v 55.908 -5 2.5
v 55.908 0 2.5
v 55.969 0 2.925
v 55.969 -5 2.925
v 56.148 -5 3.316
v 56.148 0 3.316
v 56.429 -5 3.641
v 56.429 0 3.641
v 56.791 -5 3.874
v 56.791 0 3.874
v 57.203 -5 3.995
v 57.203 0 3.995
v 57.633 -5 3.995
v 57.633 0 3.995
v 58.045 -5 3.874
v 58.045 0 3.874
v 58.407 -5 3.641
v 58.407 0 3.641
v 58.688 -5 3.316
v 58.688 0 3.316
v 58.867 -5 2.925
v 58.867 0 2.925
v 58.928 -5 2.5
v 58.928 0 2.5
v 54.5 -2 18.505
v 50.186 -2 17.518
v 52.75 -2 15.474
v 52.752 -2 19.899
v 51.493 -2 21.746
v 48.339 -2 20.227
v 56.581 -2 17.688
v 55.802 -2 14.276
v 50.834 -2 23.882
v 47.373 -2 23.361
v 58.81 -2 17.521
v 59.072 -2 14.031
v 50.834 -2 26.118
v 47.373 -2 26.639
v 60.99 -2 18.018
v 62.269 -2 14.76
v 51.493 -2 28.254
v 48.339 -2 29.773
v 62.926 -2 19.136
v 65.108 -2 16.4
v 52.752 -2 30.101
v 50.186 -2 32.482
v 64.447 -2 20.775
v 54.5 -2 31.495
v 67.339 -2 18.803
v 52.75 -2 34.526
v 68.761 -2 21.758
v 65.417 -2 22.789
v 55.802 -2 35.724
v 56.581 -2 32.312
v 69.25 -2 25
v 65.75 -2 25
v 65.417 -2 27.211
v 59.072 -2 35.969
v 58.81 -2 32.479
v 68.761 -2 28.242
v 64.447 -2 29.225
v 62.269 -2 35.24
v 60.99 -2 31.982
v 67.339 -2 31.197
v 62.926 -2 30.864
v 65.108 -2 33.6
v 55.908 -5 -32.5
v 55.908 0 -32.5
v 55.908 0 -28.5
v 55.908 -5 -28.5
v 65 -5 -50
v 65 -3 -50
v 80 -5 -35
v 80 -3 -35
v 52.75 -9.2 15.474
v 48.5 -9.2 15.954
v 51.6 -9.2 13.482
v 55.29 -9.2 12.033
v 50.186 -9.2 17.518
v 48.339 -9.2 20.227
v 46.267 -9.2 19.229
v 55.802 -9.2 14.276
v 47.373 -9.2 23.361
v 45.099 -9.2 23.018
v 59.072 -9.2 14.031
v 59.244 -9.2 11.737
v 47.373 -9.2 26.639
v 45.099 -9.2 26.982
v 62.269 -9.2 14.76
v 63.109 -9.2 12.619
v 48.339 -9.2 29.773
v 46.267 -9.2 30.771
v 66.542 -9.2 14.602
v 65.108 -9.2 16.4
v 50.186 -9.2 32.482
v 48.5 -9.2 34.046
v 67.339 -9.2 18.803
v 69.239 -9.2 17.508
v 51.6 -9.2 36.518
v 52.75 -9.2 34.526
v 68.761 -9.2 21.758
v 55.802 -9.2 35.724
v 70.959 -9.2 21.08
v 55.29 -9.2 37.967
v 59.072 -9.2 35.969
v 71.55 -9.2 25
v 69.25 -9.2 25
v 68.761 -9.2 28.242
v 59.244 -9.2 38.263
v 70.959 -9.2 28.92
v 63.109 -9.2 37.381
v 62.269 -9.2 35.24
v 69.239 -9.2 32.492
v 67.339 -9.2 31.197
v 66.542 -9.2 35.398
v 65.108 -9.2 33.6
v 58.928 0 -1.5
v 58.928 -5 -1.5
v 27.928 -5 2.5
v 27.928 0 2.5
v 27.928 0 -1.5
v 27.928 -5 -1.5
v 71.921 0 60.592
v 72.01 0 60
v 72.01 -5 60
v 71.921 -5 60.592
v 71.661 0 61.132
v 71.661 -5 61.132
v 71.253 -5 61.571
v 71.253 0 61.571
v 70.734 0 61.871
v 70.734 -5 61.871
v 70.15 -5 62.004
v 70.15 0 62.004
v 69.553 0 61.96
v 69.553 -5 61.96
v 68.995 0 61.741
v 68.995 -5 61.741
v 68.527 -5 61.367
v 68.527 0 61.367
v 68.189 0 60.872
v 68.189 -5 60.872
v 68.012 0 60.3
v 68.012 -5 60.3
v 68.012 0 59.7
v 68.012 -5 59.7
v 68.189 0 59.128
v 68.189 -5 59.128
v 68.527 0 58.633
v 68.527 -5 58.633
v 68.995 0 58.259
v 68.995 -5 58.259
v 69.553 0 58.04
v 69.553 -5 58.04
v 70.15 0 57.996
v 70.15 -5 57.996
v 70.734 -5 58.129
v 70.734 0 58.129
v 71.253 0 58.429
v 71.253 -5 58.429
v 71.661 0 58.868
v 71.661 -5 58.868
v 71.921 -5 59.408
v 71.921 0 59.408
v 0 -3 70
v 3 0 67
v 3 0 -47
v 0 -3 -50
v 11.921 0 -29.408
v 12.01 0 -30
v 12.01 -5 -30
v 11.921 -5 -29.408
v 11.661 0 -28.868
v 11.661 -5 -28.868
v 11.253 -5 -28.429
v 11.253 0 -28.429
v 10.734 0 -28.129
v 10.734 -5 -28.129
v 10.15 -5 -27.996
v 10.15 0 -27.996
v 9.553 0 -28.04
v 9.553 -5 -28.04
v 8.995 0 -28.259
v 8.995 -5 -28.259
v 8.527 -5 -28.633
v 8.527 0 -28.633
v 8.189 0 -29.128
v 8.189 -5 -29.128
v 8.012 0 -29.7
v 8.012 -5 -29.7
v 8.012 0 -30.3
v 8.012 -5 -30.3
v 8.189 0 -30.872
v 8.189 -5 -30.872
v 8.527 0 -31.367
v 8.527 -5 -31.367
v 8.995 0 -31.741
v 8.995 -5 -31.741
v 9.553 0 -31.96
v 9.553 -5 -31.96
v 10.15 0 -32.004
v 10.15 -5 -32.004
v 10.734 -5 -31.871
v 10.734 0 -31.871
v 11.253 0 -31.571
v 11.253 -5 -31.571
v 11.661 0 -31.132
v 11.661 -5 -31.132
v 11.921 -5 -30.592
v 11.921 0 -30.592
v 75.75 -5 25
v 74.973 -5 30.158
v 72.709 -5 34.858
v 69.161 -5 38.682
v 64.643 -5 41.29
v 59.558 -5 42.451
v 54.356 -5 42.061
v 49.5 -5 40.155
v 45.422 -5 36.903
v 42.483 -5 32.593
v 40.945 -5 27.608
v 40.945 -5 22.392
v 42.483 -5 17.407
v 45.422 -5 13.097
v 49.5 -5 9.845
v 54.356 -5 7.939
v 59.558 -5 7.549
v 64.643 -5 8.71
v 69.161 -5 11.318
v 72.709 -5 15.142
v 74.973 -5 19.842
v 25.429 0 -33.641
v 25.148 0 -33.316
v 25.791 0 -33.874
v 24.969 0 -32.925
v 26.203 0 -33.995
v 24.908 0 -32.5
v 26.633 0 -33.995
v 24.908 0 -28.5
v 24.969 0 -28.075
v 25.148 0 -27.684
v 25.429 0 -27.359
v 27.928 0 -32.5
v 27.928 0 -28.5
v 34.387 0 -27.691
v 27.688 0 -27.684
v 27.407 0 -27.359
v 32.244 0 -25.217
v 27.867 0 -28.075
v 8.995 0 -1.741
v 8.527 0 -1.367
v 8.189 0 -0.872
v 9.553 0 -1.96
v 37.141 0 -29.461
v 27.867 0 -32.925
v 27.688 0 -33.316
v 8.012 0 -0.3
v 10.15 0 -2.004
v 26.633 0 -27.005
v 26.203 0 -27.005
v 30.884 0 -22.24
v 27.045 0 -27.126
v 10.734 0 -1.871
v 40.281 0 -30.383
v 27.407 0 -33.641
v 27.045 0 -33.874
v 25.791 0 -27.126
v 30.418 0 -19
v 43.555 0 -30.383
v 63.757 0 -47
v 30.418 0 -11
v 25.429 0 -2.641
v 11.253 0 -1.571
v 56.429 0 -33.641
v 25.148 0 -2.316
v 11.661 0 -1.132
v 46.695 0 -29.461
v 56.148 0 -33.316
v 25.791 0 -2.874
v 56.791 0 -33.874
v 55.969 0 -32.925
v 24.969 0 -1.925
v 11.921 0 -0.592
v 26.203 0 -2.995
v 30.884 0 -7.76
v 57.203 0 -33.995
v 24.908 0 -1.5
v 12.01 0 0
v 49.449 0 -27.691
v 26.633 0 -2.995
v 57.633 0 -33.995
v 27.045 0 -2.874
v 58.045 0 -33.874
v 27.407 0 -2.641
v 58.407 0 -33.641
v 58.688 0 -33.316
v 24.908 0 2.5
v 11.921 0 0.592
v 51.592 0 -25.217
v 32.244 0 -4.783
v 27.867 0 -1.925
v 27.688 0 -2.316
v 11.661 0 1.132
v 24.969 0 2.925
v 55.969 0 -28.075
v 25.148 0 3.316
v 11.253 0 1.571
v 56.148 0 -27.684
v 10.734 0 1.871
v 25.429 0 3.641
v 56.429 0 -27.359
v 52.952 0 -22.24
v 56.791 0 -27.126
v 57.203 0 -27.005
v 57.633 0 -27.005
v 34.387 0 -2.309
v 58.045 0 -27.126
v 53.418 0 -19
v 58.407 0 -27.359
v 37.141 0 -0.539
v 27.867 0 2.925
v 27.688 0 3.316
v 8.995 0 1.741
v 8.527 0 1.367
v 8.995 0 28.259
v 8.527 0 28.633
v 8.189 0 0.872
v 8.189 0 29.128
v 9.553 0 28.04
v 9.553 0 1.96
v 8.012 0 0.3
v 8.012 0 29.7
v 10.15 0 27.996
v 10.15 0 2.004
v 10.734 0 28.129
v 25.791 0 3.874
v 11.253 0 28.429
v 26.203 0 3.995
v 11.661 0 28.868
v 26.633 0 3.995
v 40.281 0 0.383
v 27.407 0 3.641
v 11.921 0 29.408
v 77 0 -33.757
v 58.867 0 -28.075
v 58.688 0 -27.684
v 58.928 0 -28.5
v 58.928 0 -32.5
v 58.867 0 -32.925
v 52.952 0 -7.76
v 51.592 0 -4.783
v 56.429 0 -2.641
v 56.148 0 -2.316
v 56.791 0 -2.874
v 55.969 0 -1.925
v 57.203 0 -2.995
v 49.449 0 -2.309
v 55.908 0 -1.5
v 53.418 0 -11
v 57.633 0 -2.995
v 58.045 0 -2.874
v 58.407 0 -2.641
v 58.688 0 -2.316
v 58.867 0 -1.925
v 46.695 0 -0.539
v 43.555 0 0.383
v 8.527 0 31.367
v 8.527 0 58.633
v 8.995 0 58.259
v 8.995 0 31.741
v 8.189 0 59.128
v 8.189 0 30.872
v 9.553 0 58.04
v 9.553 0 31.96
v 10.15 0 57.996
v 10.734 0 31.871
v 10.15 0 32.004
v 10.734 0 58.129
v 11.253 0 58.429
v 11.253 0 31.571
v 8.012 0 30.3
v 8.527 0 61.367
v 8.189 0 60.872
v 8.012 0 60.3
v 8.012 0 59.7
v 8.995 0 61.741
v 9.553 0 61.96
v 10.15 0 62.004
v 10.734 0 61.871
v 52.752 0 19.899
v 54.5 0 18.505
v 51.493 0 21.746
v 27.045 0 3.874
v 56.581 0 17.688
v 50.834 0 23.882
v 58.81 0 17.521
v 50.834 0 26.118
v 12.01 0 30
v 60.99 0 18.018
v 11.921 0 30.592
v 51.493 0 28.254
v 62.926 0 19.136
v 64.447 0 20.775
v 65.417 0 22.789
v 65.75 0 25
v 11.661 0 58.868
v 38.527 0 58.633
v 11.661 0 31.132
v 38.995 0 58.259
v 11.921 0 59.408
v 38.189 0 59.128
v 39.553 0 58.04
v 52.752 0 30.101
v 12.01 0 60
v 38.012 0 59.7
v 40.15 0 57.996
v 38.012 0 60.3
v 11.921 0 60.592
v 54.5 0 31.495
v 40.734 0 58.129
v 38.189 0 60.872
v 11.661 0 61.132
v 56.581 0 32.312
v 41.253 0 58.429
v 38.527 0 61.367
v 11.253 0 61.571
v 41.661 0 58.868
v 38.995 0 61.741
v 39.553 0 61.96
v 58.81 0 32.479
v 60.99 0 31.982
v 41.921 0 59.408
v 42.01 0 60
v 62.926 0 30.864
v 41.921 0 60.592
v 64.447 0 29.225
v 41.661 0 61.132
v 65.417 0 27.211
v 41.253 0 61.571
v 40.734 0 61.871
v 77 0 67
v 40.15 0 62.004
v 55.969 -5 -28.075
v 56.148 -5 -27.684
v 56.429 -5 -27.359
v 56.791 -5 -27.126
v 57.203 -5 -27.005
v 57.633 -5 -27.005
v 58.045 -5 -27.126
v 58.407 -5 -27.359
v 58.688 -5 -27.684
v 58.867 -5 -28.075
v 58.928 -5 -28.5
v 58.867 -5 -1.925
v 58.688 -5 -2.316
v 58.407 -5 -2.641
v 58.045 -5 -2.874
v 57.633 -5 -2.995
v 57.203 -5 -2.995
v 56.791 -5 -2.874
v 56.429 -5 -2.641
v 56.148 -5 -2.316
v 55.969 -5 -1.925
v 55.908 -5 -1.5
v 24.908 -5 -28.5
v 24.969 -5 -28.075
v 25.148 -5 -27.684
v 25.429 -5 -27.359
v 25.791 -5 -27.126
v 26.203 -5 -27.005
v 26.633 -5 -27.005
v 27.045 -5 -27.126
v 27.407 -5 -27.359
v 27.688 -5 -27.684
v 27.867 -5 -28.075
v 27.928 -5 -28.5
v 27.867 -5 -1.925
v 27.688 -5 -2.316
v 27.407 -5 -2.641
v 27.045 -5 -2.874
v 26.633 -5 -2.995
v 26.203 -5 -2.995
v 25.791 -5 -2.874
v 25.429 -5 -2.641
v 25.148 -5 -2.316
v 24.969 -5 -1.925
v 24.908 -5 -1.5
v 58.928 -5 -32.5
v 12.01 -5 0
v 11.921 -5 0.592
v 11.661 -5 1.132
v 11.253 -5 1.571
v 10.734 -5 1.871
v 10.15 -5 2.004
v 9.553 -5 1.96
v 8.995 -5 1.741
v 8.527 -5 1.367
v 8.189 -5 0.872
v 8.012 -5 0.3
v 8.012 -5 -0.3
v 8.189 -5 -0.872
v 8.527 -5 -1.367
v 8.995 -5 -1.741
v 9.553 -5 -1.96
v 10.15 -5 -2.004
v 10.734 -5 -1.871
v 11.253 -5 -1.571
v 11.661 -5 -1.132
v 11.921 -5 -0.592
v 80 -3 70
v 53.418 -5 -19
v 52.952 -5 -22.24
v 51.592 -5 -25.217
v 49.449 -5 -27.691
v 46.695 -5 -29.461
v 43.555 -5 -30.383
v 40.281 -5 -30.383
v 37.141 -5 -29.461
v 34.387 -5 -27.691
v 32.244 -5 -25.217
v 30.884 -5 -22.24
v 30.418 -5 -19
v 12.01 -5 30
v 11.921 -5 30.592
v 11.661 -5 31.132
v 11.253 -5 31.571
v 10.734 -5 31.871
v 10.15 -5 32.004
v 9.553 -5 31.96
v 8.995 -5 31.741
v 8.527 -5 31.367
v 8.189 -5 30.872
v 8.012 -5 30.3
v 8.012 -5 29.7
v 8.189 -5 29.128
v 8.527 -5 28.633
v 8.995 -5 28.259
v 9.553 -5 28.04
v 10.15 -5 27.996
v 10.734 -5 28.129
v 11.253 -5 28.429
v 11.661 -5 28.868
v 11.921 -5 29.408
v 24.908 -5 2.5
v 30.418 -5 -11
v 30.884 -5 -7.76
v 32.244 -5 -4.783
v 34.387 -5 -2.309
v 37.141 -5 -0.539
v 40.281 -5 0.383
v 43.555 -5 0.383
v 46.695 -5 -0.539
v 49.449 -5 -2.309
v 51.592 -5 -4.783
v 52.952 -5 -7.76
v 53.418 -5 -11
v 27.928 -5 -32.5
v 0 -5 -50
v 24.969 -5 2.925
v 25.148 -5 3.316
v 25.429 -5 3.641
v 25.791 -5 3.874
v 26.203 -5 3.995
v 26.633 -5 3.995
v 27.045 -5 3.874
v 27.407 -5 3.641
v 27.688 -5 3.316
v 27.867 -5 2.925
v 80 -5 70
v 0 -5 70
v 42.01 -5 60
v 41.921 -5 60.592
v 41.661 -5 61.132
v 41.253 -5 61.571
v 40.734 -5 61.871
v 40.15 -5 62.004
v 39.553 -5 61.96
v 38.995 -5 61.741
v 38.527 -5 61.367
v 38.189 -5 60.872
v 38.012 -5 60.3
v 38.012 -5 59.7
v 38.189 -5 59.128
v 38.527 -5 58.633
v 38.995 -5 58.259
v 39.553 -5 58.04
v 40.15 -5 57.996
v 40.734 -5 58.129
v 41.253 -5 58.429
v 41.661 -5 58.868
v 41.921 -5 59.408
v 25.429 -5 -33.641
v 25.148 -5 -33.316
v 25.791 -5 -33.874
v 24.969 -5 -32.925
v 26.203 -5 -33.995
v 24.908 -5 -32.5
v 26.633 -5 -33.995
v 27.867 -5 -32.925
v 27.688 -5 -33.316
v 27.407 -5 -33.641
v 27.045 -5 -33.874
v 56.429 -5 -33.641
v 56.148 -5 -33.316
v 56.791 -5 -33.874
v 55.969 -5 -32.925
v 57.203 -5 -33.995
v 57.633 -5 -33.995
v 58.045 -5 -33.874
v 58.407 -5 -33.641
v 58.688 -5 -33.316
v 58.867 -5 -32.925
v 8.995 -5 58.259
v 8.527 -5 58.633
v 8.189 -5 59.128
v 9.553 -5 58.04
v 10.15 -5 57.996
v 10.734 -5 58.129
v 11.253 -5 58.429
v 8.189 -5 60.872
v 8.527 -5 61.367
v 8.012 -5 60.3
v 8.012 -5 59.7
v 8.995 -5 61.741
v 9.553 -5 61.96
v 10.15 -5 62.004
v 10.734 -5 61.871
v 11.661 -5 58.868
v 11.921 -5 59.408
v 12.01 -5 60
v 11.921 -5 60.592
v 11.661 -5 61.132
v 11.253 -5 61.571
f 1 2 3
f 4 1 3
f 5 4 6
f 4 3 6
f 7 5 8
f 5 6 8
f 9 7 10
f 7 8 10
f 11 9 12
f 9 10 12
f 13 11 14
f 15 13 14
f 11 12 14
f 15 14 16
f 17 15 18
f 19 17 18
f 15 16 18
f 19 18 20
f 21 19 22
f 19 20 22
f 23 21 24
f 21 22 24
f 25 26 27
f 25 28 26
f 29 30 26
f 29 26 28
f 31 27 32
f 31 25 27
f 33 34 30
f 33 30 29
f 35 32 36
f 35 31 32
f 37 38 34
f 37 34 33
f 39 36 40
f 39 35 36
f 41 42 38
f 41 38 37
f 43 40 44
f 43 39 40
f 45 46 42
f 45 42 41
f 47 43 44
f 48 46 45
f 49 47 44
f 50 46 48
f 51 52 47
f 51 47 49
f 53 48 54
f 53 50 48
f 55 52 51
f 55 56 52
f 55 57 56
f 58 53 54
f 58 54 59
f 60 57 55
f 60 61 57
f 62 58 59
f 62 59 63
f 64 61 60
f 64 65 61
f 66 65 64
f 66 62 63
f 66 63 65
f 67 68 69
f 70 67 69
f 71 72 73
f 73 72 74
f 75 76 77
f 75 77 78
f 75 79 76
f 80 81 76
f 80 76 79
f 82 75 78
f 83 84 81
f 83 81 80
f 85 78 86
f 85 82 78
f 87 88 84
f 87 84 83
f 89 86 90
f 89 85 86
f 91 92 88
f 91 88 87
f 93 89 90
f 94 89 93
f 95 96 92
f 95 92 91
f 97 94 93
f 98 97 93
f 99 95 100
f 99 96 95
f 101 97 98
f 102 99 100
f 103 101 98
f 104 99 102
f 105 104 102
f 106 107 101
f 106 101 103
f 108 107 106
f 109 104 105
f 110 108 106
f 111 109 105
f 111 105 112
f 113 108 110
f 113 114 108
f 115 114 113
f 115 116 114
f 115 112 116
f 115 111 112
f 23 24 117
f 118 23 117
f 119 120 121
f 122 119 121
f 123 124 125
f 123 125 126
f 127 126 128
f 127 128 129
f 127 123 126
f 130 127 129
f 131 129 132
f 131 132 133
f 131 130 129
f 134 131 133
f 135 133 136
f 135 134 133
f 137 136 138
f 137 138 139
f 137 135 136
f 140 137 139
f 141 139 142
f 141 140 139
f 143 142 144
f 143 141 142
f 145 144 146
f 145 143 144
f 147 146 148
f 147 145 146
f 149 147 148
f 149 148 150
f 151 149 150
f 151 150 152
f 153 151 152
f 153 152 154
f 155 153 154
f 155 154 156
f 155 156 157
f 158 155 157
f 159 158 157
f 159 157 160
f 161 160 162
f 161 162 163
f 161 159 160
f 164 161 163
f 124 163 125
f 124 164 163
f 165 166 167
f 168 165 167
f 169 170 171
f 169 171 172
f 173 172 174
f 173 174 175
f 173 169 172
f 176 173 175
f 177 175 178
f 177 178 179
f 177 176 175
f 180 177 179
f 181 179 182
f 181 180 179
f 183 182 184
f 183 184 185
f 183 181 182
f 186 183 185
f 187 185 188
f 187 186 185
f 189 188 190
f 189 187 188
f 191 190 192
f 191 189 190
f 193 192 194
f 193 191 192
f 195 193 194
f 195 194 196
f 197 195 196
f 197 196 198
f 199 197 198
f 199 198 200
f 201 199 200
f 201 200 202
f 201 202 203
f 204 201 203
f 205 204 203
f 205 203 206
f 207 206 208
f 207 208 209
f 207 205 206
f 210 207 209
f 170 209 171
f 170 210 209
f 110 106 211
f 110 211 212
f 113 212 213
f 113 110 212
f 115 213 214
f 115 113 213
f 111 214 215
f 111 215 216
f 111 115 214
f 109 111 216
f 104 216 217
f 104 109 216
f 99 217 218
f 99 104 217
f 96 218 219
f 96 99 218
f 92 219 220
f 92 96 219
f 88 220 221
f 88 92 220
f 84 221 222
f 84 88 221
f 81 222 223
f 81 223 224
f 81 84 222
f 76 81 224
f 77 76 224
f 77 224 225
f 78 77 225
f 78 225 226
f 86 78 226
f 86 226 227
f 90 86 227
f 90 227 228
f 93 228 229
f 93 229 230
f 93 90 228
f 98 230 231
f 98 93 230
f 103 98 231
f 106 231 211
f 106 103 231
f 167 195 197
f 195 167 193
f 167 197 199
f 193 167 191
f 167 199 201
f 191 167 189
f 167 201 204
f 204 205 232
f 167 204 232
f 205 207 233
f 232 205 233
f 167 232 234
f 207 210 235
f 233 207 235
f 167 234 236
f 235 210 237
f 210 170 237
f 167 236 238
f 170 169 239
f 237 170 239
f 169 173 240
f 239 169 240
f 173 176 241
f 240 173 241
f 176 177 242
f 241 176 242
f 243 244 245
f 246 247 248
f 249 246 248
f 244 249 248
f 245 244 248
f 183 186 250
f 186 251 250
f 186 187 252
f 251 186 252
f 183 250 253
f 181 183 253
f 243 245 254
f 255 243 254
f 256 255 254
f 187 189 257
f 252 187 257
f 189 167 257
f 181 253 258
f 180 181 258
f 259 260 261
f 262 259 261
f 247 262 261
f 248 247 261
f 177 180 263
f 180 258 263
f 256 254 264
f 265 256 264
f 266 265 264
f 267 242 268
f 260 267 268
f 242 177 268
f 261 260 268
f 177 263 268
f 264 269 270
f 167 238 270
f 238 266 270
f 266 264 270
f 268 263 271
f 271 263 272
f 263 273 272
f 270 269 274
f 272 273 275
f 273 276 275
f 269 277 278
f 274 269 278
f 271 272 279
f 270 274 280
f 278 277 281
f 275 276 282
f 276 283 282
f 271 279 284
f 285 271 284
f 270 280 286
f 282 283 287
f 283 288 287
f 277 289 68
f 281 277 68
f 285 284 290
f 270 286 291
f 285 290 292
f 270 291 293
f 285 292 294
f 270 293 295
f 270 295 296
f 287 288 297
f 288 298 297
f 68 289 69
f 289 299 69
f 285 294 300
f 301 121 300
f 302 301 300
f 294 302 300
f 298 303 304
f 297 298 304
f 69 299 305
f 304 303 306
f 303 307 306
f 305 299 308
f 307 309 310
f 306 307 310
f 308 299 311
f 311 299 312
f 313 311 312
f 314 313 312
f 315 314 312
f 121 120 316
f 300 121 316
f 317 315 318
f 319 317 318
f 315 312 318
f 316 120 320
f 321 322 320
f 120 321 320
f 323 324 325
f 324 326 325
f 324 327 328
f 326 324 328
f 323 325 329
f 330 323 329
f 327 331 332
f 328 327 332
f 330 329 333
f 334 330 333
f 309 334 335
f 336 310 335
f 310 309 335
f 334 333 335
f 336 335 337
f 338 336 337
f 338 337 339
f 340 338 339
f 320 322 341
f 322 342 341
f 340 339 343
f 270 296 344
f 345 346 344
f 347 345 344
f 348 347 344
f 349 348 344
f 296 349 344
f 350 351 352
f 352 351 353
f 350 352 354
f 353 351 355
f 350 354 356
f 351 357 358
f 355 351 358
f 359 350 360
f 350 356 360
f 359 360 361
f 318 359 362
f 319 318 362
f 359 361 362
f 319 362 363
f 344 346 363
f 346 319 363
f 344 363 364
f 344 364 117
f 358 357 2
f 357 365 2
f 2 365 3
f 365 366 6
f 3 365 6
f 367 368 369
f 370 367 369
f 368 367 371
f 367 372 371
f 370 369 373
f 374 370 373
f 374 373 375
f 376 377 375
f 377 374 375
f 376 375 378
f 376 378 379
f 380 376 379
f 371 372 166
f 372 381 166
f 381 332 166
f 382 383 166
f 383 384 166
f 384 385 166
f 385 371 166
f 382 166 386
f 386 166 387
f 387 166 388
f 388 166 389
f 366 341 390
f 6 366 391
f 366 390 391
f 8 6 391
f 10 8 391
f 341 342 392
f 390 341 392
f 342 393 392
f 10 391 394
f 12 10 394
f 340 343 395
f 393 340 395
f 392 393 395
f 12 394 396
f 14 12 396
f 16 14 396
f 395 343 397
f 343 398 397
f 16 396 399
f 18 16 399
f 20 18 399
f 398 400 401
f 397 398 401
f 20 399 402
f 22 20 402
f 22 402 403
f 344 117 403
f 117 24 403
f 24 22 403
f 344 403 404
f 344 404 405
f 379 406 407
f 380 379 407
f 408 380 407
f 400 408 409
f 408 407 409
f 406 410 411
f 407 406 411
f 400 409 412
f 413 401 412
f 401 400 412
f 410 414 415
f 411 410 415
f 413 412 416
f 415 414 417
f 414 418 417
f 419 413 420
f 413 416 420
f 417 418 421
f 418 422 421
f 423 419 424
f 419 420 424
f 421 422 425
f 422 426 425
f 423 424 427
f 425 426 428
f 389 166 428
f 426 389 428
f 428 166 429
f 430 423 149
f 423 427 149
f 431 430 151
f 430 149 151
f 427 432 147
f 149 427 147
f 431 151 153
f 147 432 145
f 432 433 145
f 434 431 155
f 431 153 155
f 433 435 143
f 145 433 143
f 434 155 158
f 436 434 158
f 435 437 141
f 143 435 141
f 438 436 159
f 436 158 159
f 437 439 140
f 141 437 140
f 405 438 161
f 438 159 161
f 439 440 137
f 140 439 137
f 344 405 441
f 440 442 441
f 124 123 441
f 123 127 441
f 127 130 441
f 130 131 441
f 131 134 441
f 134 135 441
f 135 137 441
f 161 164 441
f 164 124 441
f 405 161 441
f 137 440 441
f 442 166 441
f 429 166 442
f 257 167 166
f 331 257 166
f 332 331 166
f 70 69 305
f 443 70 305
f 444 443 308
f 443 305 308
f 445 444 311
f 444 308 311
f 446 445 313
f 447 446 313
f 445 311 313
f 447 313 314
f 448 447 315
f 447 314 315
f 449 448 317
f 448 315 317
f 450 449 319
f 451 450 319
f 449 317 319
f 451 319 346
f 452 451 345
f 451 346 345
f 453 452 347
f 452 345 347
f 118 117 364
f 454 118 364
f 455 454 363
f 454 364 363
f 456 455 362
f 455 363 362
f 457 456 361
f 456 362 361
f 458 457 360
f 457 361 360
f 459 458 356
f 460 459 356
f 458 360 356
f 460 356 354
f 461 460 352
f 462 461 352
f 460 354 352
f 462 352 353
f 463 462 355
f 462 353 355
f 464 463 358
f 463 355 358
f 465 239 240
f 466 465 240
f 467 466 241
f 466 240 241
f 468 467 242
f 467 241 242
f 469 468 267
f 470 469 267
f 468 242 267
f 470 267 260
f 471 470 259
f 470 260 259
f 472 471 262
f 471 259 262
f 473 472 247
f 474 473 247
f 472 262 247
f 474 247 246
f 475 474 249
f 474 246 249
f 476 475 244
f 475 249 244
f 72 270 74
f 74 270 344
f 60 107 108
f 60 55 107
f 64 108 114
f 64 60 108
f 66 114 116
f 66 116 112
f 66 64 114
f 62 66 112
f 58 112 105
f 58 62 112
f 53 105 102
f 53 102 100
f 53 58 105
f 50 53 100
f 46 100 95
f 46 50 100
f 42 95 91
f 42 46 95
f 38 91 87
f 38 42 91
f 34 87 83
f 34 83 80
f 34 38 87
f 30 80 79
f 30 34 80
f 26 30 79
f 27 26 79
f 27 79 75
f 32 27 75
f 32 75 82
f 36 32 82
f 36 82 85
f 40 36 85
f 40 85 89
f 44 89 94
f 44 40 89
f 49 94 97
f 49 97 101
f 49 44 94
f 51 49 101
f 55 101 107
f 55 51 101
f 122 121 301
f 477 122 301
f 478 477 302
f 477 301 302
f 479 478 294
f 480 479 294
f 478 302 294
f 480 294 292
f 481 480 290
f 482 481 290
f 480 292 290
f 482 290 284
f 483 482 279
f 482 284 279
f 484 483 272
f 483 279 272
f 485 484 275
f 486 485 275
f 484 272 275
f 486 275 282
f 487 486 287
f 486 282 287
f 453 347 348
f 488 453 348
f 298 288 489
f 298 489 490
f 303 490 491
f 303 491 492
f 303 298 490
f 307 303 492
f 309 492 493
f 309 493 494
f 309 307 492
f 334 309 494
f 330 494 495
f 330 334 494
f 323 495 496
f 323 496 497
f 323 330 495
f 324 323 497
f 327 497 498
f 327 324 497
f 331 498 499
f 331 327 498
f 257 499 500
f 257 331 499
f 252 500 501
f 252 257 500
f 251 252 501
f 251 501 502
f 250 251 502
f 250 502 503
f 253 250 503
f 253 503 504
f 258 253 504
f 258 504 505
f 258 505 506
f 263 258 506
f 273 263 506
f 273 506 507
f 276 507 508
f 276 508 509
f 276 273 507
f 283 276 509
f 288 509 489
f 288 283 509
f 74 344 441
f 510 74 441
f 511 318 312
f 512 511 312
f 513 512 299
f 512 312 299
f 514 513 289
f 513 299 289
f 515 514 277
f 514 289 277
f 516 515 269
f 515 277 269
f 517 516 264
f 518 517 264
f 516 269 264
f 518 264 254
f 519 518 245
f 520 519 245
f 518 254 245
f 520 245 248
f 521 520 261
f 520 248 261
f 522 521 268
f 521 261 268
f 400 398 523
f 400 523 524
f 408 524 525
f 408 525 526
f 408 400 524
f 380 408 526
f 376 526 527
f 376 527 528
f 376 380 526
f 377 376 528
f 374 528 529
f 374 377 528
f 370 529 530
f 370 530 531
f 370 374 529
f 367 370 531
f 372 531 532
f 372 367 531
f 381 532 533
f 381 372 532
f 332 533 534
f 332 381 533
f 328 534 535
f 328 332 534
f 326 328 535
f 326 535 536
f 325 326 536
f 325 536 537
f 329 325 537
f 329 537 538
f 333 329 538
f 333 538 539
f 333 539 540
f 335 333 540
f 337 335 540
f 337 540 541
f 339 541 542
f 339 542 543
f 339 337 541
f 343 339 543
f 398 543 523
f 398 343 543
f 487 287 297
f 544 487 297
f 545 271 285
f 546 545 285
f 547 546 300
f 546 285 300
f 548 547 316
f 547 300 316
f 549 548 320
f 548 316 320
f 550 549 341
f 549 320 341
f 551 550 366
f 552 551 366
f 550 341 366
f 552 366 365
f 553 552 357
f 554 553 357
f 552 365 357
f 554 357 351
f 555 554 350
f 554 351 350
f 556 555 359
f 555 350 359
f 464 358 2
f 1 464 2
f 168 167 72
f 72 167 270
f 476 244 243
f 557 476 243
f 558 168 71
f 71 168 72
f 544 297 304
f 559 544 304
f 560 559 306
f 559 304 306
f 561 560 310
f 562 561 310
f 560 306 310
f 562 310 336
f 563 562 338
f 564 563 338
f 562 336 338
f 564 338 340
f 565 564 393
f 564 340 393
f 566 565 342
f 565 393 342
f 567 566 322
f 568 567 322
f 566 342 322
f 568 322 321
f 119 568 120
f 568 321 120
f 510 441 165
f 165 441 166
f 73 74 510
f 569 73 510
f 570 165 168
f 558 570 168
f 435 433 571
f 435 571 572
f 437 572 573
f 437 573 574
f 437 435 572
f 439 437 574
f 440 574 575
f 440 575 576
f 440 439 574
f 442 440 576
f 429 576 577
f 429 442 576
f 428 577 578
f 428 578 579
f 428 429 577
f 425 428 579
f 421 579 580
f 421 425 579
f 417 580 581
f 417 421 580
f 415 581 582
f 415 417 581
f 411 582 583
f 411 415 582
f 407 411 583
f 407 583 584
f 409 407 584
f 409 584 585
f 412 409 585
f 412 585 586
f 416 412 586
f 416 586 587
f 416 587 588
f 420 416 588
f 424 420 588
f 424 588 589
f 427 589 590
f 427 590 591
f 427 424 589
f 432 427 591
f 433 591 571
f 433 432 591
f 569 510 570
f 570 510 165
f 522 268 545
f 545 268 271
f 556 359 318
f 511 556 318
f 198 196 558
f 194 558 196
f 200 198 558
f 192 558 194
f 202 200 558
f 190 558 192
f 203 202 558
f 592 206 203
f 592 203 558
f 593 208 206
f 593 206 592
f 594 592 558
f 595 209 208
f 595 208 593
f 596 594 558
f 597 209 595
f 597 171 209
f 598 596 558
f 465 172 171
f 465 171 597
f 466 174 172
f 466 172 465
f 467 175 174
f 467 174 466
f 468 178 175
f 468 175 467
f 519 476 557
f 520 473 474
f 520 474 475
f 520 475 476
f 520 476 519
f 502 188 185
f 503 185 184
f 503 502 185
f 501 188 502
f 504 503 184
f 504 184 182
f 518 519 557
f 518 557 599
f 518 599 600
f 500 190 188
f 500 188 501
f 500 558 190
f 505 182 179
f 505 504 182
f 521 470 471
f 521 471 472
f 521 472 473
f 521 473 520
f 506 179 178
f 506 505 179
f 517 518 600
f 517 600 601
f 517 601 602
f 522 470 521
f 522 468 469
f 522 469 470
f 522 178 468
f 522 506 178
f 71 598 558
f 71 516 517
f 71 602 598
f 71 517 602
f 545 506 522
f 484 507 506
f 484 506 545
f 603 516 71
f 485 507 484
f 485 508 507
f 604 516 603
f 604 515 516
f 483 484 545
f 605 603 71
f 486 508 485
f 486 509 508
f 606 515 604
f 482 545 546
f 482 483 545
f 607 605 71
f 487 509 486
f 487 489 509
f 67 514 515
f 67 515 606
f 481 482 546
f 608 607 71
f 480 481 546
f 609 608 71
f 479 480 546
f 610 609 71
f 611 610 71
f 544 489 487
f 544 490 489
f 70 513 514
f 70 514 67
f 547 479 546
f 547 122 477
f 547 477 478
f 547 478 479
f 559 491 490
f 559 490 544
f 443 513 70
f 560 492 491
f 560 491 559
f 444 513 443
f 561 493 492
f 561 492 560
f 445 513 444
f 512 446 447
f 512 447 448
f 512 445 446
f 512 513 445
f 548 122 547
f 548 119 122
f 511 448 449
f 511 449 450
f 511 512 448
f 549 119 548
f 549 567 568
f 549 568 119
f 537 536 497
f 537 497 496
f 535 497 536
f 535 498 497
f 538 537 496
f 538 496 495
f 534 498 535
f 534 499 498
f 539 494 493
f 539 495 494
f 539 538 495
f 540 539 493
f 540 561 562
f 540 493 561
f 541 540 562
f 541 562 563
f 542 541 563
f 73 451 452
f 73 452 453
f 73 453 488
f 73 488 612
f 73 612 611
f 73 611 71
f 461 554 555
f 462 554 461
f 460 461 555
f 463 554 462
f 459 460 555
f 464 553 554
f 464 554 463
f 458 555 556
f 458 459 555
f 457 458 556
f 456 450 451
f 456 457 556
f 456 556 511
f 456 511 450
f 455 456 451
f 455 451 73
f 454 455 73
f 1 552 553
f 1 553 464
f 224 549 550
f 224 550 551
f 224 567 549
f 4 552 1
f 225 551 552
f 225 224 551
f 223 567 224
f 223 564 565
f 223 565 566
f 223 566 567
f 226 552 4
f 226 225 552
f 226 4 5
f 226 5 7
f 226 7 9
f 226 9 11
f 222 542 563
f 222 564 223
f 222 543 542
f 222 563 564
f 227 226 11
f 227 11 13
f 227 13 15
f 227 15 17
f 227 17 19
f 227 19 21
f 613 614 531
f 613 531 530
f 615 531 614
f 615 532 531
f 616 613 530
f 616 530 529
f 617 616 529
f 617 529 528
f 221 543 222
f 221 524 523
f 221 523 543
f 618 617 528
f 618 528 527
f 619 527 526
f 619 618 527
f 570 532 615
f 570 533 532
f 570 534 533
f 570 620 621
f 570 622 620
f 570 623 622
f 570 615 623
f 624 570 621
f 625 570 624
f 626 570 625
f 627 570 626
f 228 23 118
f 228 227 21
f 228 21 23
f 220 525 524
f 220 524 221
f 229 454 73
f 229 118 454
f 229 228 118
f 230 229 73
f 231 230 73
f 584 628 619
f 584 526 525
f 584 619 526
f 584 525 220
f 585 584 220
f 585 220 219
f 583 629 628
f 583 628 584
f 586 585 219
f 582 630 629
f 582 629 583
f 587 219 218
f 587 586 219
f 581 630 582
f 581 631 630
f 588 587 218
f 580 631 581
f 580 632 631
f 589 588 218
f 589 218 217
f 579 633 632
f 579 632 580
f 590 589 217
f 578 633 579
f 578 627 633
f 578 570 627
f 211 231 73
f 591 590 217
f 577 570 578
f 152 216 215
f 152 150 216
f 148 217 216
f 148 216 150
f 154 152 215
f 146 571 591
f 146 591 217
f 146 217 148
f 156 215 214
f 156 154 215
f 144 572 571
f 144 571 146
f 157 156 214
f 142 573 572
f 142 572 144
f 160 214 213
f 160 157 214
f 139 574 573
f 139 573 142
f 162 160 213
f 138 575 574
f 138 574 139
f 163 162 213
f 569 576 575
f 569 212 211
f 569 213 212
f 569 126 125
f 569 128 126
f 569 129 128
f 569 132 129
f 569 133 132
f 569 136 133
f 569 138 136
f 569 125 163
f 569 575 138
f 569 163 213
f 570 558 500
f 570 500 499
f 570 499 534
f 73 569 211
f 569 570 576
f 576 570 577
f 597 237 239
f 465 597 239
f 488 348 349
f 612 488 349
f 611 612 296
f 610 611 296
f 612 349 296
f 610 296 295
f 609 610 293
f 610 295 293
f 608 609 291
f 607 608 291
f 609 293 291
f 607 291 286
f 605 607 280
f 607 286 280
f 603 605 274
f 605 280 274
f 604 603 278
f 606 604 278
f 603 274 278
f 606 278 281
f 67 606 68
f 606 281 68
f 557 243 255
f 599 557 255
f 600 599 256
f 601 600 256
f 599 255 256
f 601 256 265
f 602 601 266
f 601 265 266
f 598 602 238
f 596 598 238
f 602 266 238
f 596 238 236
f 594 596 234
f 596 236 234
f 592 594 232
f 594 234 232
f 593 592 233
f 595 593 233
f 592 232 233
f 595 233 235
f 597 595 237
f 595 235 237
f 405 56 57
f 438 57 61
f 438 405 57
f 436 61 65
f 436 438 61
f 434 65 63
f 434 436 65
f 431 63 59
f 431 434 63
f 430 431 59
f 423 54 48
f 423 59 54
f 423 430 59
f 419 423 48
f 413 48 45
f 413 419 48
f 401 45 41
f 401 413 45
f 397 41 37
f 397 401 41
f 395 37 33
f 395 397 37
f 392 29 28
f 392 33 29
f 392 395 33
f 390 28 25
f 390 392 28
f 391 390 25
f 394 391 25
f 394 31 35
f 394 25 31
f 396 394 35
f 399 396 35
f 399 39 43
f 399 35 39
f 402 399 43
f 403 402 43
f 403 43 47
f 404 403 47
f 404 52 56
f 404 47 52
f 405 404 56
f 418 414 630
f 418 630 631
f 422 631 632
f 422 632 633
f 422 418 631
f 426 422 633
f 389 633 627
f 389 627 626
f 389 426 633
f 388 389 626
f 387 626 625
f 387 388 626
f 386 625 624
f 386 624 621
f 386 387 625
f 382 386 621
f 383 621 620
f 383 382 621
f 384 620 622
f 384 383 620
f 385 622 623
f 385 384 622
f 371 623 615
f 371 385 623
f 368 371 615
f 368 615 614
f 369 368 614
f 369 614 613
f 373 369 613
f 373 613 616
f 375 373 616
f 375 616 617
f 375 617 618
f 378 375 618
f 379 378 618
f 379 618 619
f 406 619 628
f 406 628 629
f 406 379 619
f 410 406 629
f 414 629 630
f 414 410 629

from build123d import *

# Parameters (mm, degrees)
F0_R     = 2.01
F0_R_2   = 7.5
F1_DEPTH = 5
F2_SIZE  = 3
F3_R     = 11
F4_DEPTH = 3
F5_R     = 17.5
F5_R_2   = 11
F6_DEPTH = 4.2
F7_SIZE  = 4.19999


# Not quite as in the source:
# - a fillet or chamfer is up to 0.001 mm smaller than in the source, because OpenCascade refuses the exact size


with BuildPart() as f1:
    # F0 (on Front) → F1 (new body)
    with BuildSketch(Plane.XZ):
        Polygon((0, 70), (0, 0), (0, -50), (65, -50), (80, -35), (80, 70), align=None)
        with Locations((10, -30)):
            Circle(F0_R, mode=Mode.SUBTRACT)
        with BuildLine():
            ThreePointArc((24.9080765748, -28.5), (26.4180765748, -26.99), (27.9280765748, -28.5))
            Line((27.9280765748, -28.5), (27.9280765748, -32.5))
            ThreePointArc((27.9280765748, -32.5), (26.4180765748, -34.01), (24.9080765748, -32.5))
            Line((24.9080765748, -32.5), (24.9080765748, -28.5))
        make_face(mode=Mode.SUBTRACT)
        with Locations((10, 0)):
            Circle(F0_R, mode=Mode.SUBTRACT)
        with BuildLine():
            ThreePointArc((27.9280765748, -1.5), (26.4180765748, -3.01), (24.9080765748, -1.5))
            Line((24.9080765748, -1.5), (24.9080765748, 2.5))
            ThreePointArc((24.9080765748, 2.5), (26.4180765748, 4.01), (27.9280765748, 2.5))
            Line((27.9280765748, 2.5), (27.9280765748, -1.5))
        make_face(mode=Mode.SUBTRACT)
        with BuildLine():
            ThreePointArc((55.9080765748, -28.5), (57.4180765748, -26.99), (58.9280765748, -28.5))
            Line((58.9280765748, -28.5), (58.9280765748, -32.5))
            ThreePointArc((58.9280765748, -32.5), (57.4180765748, -34.01), (55.9080765748, -32.5))
            Line((55.9080765748, -32.5), (55.9080765748, -28.5))
        make_face(mode=Mode.SUBTRACT)
        with BuildLine():
            ThreePointArc((30.4180765748, -11), (41.9180765748, 0.5), (53.4180765748, -11))
            Line((53.4180765748, -11), (53.4180765748, -19))
            ThreePointArc((53.4180765748, -19), (41.9180765748, -30.5), (30.4180765748, -19))
            Line((30.4180765748, -19), (30.4180765748, -11))
        make_face(mode=Mode.SUBTRACT)
        with BuildLine():
            ThreePointArc((58.9280765748, -1.5), (57.4180765748, -3.01), (55.9080765748, -1.5))
            Line((55.9080765748, -1.5), (55.9080765748, 2.5))
            ThreePointArc((55.9080765748, 2.5), (57.4180765748, 4.01), (58.9280765748, 2.5))
            Line((58.9280765748, 2.5), (58.9280765748, -1.5))
        make_face(mode=Mode.SUBTRACT)
        with Locations((10, 30)):
            Circle(F0_R, mode=Mode.SUBTRACT)
        with Locations((10, 60)):
            Circle(F0_R, mode=Mode.SUBTRACT)
        with Locations((58.25, 25)):
            Circle(F0_R_2, mode=Mode.SUBTRACT)
        with Locations((40, 60)):
            Circle(F0_R, mode=Mode.SUBTRACT)
        with Locations((70, 60)):
            Circle(F0_R, mode=Mode.SUBTRACT)
    extrude(amount=F1_DEPTH)

    # F2
    f2_edges = [f1.edges().sort_by_distance(p)[0] for p in [
        (80, 0, 17.5),
        (40, 0, 70),
        (0, 0, 10),
        (32.5, 0, -50),
        (72.5, 0, -42.5),
    ]]
    chamfer(f2_edges, length=F2_SIZE)

    # F3 (on face) → F4 (cut)
    with BuildSketch(Plane.XZ.offset(5)):
        with Locations((58.25, 25)):
            Circle(F3_R)
    extrude(amount=-F4_DEPTH, mode=Mode.SUBTRACT)

    # F5 (on face) → F6 (join)
    with BuildSketch(Plane.XZ.offset(5)):
        with Locations((58.25, 25)):
            Circle(F5_R)
        with Locations((58.25, 25)):
            Circle(F5_R_2, mode=Mode.SUBTRACT)
    extrude(amount=F6_DEPTH)

    # F7 (size 4.2 in the source; OpenCascade refuses exactly that, so slightly less here)
    f7_edges = [f1.edges().sort_by_distance(p)[0] for p in [
        (40.75, -9.2, 25),
    ]]
    chamfer(f7_edges, length=F7_SIZE)


solid = f1.part
